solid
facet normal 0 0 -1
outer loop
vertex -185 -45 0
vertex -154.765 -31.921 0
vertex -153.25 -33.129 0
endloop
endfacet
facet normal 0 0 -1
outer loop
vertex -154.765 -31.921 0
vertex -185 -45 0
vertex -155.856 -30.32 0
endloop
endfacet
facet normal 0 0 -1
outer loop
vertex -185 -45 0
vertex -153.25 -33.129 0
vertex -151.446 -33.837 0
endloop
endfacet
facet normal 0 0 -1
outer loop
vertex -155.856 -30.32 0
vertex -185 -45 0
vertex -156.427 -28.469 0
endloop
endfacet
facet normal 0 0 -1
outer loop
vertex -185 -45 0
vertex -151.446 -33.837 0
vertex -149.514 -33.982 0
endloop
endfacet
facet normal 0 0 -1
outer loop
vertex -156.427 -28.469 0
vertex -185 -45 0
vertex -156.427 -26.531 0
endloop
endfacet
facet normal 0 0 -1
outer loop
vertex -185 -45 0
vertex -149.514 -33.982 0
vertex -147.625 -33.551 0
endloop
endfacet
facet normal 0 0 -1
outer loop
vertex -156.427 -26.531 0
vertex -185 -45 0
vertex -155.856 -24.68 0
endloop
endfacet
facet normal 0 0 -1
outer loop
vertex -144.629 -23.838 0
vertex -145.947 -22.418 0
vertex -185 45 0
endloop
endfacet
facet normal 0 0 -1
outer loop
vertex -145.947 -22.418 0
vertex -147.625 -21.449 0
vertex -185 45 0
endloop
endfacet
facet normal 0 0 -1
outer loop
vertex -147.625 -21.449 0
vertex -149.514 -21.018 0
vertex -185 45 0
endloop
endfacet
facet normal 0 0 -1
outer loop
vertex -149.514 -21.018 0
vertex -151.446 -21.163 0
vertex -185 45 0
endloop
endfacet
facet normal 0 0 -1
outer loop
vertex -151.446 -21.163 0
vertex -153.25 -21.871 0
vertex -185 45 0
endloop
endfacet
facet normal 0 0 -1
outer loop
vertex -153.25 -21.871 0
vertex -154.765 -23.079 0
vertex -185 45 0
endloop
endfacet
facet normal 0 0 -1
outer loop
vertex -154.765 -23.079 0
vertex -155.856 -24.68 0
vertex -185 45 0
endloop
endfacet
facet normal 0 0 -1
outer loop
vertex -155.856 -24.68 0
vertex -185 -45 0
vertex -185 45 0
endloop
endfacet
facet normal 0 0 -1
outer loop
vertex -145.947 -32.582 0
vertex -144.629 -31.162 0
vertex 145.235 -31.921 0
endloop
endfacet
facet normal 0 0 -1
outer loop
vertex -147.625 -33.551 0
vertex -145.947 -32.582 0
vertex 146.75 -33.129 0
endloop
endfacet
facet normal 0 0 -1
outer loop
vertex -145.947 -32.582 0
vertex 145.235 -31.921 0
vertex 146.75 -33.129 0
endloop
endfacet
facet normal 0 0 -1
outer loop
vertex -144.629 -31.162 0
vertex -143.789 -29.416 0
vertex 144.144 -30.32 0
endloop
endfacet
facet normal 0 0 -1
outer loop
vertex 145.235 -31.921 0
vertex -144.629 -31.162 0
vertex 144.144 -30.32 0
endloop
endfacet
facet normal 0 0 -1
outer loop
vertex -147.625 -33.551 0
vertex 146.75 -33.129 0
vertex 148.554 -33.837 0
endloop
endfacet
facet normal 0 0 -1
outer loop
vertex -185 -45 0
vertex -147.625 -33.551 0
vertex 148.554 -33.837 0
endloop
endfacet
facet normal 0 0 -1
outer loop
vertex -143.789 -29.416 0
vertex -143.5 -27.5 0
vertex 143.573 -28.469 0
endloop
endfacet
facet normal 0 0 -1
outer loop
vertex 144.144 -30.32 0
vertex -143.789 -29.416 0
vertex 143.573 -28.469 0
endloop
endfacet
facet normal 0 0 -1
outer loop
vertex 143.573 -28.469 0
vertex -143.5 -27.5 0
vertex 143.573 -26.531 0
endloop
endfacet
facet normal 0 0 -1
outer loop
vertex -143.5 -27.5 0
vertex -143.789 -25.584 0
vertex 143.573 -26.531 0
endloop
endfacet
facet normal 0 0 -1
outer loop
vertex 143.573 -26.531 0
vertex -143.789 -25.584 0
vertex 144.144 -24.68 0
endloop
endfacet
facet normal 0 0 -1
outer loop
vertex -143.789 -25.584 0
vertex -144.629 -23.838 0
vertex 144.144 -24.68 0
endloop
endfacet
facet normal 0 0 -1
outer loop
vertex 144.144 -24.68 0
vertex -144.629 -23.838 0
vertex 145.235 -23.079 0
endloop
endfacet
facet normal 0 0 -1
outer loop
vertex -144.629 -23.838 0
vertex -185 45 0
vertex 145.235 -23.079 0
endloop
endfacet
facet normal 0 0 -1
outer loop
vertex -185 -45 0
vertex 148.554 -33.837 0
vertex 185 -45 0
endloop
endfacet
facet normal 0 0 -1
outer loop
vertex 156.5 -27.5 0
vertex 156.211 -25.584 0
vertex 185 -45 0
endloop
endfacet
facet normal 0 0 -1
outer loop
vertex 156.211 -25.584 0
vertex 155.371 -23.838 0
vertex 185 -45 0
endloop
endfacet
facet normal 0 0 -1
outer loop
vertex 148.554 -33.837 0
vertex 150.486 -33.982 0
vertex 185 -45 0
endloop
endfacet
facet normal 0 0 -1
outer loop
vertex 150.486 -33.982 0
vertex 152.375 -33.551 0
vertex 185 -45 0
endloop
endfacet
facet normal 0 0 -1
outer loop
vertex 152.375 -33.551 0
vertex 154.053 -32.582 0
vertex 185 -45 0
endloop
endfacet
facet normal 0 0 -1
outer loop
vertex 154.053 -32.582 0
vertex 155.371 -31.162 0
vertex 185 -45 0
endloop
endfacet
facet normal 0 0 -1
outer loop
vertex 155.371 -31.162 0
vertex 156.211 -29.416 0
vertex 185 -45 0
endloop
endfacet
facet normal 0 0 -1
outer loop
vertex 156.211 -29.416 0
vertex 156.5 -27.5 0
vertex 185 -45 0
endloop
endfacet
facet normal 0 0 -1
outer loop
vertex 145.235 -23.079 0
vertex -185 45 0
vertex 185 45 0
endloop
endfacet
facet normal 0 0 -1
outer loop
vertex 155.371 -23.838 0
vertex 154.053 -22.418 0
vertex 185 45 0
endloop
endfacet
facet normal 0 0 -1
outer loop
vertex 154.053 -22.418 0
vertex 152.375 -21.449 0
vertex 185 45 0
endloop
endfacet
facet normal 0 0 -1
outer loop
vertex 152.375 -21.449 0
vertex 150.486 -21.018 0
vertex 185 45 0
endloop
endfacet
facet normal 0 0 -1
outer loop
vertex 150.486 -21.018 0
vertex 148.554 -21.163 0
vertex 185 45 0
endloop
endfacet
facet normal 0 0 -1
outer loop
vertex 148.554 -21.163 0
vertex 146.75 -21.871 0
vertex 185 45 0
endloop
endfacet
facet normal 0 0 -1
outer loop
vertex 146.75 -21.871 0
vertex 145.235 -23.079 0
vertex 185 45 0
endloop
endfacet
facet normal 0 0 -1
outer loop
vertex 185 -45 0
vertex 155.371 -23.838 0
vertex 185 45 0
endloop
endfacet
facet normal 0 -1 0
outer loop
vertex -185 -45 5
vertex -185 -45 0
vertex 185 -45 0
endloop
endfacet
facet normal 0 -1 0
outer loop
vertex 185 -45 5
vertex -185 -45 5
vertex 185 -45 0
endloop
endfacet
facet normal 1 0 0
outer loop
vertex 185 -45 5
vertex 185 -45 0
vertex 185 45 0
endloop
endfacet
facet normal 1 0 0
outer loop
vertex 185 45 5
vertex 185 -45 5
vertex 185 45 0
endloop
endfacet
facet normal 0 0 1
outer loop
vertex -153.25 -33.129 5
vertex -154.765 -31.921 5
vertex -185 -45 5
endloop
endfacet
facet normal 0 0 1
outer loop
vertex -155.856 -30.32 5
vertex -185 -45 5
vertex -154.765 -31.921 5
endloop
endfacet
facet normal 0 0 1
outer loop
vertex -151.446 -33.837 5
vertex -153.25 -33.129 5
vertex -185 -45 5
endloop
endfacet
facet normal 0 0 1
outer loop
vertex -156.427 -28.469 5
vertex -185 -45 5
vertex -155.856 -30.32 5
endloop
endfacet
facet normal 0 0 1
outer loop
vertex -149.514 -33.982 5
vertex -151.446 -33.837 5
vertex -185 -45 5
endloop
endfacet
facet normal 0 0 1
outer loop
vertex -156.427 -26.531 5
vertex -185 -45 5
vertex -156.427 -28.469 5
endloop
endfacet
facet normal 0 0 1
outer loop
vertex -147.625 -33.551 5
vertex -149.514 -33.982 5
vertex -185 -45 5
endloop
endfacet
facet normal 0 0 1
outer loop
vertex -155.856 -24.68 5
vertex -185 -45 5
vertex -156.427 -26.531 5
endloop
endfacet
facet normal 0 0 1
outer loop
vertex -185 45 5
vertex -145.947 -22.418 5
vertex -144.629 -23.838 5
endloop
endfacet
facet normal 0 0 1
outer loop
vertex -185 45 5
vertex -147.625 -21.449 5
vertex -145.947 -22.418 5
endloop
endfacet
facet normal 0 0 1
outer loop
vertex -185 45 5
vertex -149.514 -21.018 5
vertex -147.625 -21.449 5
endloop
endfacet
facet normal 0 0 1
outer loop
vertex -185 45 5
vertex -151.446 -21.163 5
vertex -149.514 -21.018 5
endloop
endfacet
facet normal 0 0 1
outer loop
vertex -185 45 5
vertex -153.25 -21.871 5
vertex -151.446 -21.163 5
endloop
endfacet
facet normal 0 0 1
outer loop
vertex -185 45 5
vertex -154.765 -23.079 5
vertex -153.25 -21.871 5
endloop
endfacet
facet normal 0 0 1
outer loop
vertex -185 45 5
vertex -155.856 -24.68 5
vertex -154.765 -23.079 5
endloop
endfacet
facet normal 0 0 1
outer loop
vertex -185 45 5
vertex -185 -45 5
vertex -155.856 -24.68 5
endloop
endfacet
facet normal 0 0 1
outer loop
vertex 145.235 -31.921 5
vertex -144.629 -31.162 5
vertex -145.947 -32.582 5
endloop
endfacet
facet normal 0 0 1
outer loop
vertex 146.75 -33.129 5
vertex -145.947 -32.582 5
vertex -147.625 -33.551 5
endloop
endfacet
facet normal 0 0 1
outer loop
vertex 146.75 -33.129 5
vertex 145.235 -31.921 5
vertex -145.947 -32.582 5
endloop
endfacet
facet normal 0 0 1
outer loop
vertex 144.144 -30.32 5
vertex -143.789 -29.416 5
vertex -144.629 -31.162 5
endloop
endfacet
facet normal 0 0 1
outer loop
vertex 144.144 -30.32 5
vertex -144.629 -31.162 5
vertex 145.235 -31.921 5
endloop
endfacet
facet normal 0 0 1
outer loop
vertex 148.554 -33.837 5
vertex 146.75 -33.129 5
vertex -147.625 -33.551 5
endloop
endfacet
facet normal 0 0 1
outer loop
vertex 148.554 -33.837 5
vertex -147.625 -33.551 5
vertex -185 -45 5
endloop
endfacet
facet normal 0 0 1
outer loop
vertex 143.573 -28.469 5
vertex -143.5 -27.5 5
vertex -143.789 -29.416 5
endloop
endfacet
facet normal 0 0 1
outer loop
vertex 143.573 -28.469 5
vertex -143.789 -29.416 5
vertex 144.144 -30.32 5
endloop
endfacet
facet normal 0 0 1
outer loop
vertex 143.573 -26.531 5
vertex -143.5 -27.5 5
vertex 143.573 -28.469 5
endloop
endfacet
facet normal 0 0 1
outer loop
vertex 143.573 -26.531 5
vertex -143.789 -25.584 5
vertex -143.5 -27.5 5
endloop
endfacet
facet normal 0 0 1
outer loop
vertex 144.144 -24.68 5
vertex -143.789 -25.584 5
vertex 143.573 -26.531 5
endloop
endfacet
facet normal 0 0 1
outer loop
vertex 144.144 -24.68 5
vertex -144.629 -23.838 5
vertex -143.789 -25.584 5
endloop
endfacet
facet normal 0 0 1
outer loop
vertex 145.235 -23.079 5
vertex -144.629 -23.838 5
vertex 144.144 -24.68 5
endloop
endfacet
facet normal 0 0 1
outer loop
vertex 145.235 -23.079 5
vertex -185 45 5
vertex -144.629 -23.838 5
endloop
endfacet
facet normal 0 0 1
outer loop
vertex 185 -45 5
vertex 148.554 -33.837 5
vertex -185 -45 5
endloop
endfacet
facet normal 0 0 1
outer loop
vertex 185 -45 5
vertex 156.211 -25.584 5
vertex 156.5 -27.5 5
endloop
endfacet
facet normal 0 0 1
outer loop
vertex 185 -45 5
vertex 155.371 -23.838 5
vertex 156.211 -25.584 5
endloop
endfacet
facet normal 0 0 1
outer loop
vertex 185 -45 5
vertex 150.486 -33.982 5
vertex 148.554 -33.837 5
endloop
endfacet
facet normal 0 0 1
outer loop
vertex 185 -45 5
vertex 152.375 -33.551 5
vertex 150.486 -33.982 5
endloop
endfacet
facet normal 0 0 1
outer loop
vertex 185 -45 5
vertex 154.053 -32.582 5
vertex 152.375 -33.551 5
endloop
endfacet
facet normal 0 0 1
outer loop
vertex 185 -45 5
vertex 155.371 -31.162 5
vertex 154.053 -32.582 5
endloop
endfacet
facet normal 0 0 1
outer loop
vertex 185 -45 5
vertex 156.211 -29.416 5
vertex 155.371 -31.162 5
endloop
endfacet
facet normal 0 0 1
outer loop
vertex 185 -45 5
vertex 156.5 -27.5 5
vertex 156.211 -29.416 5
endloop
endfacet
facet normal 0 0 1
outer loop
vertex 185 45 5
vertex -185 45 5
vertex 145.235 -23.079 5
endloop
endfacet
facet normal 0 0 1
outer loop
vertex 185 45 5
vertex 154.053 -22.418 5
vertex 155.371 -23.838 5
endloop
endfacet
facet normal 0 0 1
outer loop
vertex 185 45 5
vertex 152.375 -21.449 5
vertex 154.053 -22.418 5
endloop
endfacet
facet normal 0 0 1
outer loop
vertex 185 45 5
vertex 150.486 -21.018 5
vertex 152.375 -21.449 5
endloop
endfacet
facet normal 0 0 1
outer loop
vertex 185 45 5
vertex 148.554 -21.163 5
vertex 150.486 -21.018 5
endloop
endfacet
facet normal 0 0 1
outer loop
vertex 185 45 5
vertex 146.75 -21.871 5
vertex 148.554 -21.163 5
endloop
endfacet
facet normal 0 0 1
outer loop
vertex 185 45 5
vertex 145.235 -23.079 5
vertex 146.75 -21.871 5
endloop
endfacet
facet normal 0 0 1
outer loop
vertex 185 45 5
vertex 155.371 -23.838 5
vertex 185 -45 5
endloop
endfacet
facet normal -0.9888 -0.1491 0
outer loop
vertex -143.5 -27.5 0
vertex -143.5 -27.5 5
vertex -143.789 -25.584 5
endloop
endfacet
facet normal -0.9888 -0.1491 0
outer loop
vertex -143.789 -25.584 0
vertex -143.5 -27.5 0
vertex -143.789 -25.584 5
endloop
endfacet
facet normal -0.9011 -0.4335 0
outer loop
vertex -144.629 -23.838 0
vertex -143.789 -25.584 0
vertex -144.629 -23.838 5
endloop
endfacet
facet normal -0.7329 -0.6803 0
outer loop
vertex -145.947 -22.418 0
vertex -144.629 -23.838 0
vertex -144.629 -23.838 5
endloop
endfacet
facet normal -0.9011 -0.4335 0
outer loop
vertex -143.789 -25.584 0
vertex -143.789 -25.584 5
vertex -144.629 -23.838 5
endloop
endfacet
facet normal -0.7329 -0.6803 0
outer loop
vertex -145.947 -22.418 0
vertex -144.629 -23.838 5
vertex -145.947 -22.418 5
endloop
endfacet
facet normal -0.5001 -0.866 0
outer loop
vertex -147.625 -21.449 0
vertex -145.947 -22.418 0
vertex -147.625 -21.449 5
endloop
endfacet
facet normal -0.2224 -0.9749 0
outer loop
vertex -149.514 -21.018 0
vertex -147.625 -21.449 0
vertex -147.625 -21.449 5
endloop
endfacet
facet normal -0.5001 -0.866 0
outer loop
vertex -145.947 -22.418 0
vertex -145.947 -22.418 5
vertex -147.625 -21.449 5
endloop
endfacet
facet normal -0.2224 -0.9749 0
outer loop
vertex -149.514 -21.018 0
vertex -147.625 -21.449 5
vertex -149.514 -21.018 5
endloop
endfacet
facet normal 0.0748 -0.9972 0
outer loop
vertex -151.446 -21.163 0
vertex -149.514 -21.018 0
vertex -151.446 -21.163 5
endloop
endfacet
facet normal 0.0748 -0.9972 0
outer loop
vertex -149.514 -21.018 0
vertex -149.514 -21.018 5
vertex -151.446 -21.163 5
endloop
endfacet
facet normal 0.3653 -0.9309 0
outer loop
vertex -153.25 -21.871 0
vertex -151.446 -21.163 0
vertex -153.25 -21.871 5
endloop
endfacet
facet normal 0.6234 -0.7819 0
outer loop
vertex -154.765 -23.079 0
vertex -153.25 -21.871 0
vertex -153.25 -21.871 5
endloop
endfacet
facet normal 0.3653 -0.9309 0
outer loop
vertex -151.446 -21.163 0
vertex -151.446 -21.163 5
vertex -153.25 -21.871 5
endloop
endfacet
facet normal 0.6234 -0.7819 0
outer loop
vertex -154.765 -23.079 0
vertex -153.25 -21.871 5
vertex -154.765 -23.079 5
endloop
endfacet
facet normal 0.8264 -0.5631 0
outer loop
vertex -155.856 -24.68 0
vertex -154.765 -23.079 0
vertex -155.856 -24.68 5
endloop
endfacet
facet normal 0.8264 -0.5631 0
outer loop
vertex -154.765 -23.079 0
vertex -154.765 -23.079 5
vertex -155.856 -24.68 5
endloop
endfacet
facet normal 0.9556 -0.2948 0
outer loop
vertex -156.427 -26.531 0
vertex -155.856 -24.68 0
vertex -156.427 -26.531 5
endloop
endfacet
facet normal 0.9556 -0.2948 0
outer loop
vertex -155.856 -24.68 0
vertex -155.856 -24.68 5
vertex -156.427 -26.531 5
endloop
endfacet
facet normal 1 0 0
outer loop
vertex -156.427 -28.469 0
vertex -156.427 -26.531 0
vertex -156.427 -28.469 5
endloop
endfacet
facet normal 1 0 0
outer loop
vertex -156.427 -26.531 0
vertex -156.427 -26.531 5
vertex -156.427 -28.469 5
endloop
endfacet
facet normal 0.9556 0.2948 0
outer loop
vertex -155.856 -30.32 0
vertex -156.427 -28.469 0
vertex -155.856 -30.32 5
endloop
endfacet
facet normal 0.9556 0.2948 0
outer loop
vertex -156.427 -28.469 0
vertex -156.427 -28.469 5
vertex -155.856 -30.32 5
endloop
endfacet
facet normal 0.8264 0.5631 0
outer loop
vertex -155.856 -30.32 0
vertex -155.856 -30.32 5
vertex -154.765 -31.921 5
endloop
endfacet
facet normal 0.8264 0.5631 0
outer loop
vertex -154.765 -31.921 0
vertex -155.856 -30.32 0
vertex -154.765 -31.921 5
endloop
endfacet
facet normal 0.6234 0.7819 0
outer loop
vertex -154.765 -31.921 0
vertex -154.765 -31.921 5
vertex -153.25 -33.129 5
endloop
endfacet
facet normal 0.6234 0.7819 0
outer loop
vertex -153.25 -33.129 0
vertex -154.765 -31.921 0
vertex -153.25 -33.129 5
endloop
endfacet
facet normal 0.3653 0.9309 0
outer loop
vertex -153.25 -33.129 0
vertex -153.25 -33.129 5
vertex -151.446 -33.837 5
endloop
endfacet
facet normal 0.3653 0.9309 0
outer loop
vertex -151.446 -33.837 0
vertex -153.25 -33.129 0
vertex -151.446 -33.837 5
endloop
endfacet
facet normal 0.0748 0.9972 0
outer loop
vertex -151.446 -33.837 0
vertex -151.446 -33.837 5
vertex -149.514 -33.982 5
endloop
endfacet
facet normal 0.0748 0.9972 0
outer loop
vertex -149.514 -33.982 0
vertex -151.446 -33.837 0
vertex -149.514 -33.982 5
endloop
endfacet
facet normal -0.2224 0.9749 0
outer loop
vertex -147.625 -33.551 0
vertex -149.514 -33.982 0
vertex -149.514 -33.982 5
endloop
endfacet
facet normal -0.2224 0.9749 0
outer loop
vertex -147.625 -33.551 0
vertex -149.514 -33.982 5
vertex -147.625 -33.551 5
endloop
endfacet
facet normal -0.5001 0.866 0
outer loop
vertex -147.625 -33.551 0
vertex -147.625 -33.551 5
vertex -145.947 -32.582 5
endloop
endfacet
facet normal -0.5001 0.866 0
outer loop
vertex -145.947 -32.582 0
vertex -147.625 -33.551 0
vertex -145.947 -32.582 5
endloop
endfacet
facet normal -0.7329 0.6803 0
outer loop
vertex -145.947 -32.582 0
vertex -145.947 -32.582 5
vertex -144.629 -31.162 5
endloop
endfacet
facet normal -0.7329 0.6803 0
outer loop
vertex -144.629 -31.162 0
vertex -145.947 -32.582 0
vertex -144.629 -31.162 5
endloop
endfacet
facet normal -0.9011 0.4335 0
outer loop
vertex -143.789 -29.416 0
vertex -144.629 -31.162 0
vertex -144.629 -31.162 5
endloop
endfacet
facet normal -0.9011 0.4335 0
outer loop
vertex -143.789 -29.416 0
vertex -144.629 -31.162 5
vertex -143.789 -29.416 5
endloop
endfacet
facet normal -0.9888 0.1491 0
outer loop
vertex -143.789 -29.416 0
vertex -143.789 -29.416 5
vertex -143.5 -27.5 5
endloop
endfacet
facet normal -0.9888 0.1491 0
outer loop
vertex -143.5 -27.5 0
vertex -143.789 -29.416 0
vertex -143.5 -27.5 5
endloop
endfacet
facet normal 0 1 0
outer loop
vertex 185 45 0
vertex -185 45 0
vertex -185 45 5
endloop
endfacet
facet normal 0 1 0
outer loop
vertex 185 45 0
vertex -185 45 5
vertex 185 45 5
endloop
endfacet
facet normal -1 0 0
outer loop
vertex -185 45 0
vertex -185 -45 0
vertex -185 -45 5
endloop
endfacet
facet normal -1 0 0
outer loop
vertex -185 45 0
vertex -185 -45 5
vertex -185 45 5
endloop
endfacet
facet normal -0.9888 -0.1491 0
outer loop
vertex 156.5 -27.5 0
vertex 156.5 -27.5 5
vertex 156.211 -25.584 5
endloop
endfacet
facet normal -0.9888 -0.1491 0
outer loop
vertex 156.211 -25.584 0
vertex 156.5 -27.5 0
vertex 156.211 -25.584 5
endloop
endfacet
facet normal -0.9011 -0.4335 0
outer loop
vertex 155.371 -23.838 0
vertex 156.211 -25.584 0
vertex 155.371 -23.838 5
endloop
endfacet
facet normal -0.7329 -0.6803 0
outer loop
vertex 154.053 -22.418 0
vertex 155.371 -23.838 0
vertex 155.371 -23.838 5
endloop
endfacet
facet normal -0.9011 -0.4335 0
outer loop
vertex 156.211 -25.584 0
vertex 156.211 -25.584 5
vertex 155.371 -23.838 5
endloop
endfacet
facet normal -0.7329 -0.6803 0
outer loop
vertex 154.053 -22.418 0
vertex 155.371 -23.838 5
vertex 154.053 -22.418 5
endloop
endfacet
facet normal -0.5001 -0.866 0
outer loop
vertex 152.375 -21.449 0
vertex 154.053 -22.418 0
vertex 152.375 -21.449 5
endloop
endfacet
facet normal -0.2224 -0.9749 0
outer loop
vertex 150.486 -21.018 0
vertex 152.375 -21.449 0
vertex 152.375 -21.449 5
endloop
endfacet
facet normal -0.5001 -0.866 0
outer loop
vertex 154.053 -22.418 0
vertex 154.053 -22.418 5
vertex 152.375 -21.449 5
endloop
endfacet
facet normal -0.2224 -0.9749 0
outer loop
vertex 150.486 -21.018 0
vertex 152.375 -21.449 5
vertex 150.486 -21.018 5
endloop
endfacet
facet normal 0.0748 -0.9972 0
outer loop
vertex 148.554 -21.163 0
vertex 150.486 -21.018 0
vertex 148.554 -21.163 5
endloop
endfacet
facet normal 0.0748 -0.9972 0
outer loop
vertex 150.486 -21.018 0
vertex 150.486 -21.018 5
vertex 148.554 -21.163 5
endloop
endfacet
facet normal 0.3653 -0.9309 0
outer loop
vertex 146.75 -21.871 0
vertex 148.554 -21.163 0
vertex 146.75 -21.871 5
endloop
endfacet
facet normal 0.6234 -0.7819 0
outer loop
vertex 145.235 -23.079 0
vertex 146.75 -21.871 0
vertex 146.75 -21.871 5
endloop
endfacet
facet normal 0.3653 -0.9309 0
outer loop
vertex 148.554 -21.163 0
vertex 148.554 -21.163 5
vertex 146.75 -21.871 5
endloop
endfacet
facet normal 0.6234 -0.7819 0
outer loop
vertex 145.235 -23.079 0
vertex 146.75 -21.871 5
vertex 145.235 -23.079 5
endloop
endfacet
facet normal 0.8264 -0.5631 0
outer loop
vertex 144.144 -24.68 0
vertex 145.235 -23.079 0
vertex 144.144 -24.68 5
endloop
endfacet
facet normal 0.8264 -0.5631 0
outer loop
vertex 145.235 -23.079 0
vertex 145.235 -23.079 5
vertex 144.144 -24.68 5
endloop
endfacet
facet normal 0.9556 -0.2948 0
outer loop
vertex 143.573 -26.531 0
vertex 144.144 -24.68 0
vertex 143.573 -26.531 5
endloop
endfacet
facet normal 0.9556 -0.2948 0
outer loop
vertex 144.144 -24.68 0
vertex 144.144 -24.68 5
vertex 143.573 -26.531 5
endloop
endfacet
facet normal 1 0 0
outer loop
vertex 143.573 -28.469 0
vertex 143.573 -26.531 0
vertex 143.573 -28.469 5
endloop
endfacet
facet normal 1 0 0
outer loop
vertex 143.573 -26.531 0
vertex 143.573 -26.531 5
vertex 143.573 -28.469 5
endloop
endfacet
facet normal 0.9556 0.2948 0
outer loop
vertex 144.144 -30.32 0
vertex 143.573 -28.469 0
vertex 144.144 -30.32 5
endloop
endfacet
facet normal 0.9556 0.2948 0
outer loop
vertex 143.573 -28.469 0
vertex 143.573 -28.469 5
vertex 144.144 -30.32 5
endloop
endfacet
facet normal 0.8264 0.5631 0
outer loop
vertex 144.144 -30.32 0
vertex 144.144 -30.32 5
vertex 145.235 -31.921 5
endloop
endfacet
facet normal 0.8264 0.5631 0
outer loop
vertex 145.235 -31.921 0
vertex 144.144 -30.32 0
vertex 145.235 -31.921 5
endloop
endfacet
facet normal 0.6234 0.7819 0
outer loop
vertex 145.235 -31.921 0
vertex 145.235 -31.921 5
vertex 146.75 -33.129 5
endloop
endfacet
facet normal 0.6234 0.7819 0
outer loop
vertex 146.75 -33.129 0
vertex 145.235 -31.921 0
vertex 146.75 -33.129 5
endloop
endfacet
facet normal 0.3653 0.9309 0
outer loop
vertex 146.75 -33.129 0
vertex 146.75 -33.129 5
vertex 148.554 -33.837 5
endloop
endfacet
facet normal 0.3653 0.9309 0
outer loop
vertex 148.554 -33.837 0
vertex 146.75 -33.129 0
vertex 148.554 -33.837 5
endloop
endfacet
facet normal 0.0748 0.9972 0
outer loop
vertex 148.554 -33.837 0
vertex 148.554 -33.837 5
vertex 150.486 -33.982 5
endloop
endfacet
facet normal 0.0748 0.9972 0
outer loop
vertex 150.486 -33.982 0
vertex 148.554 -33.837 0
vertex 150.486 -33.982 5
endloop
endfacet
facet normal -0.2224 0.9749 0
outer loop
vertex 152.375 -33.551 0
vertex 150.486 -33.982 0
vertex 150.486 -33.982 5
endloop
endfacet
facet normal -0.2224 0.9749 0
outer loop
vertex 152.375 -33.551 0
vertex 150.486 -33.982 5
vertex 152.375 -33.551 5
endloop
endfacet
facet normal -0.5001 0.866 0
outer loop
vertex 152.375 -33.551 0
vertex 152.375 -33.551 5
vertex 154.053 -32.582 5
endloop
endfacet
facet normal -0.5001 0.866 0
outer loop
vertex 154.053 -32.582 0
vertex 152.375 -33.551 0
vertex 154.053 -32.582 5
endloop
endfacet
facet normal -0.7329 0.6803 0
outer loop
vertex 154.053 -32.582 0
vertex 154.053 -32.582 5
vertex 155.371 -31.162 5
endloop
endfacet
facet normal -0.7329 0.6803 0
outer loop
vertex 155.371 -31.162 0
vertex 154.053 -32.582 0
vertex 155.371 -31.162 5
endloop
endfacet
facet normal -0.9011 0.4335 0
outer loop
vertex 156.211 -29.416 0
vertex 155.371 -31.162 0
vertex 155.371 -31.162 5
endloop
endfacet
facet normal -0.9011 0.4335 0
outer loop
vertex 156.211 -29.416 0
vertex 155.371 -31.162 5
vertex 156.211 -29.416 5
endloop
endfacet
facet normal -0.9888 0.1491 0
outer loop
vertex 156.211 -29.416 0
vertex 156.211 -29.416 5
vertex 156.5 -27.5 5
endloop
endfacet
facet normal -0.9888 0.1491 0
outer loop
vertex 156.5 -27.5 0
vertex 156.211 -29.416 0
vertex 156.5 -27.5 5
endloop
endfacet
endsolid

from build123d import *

# Parameters (mm, degrees)
SKETCH1_W           = 370
SKETCH1_H           = 90
BOSS_EXTRUDE1_DEPTH = 5
SKETCH2_R           = 6.5
CUT_EXTRUDE1_DEPTH  = 10


with BuildPart() as part:
    # Sketch1 → Boss-Extrude1 (new body)
    with BuildSketch(Plane.XY):
        Rectangle(SKETCH1_W, SKETCH1_H)
    extrude(amount=BOSS_EXTRUDE1_DEPTH)

    # Sketch2 → Cut-Extrude1 (cut)
    with BuildSketch(Plane.XY.offset(5)):
        with Locations((150, -27.5)):
            Circle(SKETCH2_R)
        with Locations((-150, -27.5)):
            Circle(SKETCH2_R)
    extrude(amount=-CUT_EXTRUDE1_DEPTH, mode=Mode.SUBTRACT)


solid = part.part
